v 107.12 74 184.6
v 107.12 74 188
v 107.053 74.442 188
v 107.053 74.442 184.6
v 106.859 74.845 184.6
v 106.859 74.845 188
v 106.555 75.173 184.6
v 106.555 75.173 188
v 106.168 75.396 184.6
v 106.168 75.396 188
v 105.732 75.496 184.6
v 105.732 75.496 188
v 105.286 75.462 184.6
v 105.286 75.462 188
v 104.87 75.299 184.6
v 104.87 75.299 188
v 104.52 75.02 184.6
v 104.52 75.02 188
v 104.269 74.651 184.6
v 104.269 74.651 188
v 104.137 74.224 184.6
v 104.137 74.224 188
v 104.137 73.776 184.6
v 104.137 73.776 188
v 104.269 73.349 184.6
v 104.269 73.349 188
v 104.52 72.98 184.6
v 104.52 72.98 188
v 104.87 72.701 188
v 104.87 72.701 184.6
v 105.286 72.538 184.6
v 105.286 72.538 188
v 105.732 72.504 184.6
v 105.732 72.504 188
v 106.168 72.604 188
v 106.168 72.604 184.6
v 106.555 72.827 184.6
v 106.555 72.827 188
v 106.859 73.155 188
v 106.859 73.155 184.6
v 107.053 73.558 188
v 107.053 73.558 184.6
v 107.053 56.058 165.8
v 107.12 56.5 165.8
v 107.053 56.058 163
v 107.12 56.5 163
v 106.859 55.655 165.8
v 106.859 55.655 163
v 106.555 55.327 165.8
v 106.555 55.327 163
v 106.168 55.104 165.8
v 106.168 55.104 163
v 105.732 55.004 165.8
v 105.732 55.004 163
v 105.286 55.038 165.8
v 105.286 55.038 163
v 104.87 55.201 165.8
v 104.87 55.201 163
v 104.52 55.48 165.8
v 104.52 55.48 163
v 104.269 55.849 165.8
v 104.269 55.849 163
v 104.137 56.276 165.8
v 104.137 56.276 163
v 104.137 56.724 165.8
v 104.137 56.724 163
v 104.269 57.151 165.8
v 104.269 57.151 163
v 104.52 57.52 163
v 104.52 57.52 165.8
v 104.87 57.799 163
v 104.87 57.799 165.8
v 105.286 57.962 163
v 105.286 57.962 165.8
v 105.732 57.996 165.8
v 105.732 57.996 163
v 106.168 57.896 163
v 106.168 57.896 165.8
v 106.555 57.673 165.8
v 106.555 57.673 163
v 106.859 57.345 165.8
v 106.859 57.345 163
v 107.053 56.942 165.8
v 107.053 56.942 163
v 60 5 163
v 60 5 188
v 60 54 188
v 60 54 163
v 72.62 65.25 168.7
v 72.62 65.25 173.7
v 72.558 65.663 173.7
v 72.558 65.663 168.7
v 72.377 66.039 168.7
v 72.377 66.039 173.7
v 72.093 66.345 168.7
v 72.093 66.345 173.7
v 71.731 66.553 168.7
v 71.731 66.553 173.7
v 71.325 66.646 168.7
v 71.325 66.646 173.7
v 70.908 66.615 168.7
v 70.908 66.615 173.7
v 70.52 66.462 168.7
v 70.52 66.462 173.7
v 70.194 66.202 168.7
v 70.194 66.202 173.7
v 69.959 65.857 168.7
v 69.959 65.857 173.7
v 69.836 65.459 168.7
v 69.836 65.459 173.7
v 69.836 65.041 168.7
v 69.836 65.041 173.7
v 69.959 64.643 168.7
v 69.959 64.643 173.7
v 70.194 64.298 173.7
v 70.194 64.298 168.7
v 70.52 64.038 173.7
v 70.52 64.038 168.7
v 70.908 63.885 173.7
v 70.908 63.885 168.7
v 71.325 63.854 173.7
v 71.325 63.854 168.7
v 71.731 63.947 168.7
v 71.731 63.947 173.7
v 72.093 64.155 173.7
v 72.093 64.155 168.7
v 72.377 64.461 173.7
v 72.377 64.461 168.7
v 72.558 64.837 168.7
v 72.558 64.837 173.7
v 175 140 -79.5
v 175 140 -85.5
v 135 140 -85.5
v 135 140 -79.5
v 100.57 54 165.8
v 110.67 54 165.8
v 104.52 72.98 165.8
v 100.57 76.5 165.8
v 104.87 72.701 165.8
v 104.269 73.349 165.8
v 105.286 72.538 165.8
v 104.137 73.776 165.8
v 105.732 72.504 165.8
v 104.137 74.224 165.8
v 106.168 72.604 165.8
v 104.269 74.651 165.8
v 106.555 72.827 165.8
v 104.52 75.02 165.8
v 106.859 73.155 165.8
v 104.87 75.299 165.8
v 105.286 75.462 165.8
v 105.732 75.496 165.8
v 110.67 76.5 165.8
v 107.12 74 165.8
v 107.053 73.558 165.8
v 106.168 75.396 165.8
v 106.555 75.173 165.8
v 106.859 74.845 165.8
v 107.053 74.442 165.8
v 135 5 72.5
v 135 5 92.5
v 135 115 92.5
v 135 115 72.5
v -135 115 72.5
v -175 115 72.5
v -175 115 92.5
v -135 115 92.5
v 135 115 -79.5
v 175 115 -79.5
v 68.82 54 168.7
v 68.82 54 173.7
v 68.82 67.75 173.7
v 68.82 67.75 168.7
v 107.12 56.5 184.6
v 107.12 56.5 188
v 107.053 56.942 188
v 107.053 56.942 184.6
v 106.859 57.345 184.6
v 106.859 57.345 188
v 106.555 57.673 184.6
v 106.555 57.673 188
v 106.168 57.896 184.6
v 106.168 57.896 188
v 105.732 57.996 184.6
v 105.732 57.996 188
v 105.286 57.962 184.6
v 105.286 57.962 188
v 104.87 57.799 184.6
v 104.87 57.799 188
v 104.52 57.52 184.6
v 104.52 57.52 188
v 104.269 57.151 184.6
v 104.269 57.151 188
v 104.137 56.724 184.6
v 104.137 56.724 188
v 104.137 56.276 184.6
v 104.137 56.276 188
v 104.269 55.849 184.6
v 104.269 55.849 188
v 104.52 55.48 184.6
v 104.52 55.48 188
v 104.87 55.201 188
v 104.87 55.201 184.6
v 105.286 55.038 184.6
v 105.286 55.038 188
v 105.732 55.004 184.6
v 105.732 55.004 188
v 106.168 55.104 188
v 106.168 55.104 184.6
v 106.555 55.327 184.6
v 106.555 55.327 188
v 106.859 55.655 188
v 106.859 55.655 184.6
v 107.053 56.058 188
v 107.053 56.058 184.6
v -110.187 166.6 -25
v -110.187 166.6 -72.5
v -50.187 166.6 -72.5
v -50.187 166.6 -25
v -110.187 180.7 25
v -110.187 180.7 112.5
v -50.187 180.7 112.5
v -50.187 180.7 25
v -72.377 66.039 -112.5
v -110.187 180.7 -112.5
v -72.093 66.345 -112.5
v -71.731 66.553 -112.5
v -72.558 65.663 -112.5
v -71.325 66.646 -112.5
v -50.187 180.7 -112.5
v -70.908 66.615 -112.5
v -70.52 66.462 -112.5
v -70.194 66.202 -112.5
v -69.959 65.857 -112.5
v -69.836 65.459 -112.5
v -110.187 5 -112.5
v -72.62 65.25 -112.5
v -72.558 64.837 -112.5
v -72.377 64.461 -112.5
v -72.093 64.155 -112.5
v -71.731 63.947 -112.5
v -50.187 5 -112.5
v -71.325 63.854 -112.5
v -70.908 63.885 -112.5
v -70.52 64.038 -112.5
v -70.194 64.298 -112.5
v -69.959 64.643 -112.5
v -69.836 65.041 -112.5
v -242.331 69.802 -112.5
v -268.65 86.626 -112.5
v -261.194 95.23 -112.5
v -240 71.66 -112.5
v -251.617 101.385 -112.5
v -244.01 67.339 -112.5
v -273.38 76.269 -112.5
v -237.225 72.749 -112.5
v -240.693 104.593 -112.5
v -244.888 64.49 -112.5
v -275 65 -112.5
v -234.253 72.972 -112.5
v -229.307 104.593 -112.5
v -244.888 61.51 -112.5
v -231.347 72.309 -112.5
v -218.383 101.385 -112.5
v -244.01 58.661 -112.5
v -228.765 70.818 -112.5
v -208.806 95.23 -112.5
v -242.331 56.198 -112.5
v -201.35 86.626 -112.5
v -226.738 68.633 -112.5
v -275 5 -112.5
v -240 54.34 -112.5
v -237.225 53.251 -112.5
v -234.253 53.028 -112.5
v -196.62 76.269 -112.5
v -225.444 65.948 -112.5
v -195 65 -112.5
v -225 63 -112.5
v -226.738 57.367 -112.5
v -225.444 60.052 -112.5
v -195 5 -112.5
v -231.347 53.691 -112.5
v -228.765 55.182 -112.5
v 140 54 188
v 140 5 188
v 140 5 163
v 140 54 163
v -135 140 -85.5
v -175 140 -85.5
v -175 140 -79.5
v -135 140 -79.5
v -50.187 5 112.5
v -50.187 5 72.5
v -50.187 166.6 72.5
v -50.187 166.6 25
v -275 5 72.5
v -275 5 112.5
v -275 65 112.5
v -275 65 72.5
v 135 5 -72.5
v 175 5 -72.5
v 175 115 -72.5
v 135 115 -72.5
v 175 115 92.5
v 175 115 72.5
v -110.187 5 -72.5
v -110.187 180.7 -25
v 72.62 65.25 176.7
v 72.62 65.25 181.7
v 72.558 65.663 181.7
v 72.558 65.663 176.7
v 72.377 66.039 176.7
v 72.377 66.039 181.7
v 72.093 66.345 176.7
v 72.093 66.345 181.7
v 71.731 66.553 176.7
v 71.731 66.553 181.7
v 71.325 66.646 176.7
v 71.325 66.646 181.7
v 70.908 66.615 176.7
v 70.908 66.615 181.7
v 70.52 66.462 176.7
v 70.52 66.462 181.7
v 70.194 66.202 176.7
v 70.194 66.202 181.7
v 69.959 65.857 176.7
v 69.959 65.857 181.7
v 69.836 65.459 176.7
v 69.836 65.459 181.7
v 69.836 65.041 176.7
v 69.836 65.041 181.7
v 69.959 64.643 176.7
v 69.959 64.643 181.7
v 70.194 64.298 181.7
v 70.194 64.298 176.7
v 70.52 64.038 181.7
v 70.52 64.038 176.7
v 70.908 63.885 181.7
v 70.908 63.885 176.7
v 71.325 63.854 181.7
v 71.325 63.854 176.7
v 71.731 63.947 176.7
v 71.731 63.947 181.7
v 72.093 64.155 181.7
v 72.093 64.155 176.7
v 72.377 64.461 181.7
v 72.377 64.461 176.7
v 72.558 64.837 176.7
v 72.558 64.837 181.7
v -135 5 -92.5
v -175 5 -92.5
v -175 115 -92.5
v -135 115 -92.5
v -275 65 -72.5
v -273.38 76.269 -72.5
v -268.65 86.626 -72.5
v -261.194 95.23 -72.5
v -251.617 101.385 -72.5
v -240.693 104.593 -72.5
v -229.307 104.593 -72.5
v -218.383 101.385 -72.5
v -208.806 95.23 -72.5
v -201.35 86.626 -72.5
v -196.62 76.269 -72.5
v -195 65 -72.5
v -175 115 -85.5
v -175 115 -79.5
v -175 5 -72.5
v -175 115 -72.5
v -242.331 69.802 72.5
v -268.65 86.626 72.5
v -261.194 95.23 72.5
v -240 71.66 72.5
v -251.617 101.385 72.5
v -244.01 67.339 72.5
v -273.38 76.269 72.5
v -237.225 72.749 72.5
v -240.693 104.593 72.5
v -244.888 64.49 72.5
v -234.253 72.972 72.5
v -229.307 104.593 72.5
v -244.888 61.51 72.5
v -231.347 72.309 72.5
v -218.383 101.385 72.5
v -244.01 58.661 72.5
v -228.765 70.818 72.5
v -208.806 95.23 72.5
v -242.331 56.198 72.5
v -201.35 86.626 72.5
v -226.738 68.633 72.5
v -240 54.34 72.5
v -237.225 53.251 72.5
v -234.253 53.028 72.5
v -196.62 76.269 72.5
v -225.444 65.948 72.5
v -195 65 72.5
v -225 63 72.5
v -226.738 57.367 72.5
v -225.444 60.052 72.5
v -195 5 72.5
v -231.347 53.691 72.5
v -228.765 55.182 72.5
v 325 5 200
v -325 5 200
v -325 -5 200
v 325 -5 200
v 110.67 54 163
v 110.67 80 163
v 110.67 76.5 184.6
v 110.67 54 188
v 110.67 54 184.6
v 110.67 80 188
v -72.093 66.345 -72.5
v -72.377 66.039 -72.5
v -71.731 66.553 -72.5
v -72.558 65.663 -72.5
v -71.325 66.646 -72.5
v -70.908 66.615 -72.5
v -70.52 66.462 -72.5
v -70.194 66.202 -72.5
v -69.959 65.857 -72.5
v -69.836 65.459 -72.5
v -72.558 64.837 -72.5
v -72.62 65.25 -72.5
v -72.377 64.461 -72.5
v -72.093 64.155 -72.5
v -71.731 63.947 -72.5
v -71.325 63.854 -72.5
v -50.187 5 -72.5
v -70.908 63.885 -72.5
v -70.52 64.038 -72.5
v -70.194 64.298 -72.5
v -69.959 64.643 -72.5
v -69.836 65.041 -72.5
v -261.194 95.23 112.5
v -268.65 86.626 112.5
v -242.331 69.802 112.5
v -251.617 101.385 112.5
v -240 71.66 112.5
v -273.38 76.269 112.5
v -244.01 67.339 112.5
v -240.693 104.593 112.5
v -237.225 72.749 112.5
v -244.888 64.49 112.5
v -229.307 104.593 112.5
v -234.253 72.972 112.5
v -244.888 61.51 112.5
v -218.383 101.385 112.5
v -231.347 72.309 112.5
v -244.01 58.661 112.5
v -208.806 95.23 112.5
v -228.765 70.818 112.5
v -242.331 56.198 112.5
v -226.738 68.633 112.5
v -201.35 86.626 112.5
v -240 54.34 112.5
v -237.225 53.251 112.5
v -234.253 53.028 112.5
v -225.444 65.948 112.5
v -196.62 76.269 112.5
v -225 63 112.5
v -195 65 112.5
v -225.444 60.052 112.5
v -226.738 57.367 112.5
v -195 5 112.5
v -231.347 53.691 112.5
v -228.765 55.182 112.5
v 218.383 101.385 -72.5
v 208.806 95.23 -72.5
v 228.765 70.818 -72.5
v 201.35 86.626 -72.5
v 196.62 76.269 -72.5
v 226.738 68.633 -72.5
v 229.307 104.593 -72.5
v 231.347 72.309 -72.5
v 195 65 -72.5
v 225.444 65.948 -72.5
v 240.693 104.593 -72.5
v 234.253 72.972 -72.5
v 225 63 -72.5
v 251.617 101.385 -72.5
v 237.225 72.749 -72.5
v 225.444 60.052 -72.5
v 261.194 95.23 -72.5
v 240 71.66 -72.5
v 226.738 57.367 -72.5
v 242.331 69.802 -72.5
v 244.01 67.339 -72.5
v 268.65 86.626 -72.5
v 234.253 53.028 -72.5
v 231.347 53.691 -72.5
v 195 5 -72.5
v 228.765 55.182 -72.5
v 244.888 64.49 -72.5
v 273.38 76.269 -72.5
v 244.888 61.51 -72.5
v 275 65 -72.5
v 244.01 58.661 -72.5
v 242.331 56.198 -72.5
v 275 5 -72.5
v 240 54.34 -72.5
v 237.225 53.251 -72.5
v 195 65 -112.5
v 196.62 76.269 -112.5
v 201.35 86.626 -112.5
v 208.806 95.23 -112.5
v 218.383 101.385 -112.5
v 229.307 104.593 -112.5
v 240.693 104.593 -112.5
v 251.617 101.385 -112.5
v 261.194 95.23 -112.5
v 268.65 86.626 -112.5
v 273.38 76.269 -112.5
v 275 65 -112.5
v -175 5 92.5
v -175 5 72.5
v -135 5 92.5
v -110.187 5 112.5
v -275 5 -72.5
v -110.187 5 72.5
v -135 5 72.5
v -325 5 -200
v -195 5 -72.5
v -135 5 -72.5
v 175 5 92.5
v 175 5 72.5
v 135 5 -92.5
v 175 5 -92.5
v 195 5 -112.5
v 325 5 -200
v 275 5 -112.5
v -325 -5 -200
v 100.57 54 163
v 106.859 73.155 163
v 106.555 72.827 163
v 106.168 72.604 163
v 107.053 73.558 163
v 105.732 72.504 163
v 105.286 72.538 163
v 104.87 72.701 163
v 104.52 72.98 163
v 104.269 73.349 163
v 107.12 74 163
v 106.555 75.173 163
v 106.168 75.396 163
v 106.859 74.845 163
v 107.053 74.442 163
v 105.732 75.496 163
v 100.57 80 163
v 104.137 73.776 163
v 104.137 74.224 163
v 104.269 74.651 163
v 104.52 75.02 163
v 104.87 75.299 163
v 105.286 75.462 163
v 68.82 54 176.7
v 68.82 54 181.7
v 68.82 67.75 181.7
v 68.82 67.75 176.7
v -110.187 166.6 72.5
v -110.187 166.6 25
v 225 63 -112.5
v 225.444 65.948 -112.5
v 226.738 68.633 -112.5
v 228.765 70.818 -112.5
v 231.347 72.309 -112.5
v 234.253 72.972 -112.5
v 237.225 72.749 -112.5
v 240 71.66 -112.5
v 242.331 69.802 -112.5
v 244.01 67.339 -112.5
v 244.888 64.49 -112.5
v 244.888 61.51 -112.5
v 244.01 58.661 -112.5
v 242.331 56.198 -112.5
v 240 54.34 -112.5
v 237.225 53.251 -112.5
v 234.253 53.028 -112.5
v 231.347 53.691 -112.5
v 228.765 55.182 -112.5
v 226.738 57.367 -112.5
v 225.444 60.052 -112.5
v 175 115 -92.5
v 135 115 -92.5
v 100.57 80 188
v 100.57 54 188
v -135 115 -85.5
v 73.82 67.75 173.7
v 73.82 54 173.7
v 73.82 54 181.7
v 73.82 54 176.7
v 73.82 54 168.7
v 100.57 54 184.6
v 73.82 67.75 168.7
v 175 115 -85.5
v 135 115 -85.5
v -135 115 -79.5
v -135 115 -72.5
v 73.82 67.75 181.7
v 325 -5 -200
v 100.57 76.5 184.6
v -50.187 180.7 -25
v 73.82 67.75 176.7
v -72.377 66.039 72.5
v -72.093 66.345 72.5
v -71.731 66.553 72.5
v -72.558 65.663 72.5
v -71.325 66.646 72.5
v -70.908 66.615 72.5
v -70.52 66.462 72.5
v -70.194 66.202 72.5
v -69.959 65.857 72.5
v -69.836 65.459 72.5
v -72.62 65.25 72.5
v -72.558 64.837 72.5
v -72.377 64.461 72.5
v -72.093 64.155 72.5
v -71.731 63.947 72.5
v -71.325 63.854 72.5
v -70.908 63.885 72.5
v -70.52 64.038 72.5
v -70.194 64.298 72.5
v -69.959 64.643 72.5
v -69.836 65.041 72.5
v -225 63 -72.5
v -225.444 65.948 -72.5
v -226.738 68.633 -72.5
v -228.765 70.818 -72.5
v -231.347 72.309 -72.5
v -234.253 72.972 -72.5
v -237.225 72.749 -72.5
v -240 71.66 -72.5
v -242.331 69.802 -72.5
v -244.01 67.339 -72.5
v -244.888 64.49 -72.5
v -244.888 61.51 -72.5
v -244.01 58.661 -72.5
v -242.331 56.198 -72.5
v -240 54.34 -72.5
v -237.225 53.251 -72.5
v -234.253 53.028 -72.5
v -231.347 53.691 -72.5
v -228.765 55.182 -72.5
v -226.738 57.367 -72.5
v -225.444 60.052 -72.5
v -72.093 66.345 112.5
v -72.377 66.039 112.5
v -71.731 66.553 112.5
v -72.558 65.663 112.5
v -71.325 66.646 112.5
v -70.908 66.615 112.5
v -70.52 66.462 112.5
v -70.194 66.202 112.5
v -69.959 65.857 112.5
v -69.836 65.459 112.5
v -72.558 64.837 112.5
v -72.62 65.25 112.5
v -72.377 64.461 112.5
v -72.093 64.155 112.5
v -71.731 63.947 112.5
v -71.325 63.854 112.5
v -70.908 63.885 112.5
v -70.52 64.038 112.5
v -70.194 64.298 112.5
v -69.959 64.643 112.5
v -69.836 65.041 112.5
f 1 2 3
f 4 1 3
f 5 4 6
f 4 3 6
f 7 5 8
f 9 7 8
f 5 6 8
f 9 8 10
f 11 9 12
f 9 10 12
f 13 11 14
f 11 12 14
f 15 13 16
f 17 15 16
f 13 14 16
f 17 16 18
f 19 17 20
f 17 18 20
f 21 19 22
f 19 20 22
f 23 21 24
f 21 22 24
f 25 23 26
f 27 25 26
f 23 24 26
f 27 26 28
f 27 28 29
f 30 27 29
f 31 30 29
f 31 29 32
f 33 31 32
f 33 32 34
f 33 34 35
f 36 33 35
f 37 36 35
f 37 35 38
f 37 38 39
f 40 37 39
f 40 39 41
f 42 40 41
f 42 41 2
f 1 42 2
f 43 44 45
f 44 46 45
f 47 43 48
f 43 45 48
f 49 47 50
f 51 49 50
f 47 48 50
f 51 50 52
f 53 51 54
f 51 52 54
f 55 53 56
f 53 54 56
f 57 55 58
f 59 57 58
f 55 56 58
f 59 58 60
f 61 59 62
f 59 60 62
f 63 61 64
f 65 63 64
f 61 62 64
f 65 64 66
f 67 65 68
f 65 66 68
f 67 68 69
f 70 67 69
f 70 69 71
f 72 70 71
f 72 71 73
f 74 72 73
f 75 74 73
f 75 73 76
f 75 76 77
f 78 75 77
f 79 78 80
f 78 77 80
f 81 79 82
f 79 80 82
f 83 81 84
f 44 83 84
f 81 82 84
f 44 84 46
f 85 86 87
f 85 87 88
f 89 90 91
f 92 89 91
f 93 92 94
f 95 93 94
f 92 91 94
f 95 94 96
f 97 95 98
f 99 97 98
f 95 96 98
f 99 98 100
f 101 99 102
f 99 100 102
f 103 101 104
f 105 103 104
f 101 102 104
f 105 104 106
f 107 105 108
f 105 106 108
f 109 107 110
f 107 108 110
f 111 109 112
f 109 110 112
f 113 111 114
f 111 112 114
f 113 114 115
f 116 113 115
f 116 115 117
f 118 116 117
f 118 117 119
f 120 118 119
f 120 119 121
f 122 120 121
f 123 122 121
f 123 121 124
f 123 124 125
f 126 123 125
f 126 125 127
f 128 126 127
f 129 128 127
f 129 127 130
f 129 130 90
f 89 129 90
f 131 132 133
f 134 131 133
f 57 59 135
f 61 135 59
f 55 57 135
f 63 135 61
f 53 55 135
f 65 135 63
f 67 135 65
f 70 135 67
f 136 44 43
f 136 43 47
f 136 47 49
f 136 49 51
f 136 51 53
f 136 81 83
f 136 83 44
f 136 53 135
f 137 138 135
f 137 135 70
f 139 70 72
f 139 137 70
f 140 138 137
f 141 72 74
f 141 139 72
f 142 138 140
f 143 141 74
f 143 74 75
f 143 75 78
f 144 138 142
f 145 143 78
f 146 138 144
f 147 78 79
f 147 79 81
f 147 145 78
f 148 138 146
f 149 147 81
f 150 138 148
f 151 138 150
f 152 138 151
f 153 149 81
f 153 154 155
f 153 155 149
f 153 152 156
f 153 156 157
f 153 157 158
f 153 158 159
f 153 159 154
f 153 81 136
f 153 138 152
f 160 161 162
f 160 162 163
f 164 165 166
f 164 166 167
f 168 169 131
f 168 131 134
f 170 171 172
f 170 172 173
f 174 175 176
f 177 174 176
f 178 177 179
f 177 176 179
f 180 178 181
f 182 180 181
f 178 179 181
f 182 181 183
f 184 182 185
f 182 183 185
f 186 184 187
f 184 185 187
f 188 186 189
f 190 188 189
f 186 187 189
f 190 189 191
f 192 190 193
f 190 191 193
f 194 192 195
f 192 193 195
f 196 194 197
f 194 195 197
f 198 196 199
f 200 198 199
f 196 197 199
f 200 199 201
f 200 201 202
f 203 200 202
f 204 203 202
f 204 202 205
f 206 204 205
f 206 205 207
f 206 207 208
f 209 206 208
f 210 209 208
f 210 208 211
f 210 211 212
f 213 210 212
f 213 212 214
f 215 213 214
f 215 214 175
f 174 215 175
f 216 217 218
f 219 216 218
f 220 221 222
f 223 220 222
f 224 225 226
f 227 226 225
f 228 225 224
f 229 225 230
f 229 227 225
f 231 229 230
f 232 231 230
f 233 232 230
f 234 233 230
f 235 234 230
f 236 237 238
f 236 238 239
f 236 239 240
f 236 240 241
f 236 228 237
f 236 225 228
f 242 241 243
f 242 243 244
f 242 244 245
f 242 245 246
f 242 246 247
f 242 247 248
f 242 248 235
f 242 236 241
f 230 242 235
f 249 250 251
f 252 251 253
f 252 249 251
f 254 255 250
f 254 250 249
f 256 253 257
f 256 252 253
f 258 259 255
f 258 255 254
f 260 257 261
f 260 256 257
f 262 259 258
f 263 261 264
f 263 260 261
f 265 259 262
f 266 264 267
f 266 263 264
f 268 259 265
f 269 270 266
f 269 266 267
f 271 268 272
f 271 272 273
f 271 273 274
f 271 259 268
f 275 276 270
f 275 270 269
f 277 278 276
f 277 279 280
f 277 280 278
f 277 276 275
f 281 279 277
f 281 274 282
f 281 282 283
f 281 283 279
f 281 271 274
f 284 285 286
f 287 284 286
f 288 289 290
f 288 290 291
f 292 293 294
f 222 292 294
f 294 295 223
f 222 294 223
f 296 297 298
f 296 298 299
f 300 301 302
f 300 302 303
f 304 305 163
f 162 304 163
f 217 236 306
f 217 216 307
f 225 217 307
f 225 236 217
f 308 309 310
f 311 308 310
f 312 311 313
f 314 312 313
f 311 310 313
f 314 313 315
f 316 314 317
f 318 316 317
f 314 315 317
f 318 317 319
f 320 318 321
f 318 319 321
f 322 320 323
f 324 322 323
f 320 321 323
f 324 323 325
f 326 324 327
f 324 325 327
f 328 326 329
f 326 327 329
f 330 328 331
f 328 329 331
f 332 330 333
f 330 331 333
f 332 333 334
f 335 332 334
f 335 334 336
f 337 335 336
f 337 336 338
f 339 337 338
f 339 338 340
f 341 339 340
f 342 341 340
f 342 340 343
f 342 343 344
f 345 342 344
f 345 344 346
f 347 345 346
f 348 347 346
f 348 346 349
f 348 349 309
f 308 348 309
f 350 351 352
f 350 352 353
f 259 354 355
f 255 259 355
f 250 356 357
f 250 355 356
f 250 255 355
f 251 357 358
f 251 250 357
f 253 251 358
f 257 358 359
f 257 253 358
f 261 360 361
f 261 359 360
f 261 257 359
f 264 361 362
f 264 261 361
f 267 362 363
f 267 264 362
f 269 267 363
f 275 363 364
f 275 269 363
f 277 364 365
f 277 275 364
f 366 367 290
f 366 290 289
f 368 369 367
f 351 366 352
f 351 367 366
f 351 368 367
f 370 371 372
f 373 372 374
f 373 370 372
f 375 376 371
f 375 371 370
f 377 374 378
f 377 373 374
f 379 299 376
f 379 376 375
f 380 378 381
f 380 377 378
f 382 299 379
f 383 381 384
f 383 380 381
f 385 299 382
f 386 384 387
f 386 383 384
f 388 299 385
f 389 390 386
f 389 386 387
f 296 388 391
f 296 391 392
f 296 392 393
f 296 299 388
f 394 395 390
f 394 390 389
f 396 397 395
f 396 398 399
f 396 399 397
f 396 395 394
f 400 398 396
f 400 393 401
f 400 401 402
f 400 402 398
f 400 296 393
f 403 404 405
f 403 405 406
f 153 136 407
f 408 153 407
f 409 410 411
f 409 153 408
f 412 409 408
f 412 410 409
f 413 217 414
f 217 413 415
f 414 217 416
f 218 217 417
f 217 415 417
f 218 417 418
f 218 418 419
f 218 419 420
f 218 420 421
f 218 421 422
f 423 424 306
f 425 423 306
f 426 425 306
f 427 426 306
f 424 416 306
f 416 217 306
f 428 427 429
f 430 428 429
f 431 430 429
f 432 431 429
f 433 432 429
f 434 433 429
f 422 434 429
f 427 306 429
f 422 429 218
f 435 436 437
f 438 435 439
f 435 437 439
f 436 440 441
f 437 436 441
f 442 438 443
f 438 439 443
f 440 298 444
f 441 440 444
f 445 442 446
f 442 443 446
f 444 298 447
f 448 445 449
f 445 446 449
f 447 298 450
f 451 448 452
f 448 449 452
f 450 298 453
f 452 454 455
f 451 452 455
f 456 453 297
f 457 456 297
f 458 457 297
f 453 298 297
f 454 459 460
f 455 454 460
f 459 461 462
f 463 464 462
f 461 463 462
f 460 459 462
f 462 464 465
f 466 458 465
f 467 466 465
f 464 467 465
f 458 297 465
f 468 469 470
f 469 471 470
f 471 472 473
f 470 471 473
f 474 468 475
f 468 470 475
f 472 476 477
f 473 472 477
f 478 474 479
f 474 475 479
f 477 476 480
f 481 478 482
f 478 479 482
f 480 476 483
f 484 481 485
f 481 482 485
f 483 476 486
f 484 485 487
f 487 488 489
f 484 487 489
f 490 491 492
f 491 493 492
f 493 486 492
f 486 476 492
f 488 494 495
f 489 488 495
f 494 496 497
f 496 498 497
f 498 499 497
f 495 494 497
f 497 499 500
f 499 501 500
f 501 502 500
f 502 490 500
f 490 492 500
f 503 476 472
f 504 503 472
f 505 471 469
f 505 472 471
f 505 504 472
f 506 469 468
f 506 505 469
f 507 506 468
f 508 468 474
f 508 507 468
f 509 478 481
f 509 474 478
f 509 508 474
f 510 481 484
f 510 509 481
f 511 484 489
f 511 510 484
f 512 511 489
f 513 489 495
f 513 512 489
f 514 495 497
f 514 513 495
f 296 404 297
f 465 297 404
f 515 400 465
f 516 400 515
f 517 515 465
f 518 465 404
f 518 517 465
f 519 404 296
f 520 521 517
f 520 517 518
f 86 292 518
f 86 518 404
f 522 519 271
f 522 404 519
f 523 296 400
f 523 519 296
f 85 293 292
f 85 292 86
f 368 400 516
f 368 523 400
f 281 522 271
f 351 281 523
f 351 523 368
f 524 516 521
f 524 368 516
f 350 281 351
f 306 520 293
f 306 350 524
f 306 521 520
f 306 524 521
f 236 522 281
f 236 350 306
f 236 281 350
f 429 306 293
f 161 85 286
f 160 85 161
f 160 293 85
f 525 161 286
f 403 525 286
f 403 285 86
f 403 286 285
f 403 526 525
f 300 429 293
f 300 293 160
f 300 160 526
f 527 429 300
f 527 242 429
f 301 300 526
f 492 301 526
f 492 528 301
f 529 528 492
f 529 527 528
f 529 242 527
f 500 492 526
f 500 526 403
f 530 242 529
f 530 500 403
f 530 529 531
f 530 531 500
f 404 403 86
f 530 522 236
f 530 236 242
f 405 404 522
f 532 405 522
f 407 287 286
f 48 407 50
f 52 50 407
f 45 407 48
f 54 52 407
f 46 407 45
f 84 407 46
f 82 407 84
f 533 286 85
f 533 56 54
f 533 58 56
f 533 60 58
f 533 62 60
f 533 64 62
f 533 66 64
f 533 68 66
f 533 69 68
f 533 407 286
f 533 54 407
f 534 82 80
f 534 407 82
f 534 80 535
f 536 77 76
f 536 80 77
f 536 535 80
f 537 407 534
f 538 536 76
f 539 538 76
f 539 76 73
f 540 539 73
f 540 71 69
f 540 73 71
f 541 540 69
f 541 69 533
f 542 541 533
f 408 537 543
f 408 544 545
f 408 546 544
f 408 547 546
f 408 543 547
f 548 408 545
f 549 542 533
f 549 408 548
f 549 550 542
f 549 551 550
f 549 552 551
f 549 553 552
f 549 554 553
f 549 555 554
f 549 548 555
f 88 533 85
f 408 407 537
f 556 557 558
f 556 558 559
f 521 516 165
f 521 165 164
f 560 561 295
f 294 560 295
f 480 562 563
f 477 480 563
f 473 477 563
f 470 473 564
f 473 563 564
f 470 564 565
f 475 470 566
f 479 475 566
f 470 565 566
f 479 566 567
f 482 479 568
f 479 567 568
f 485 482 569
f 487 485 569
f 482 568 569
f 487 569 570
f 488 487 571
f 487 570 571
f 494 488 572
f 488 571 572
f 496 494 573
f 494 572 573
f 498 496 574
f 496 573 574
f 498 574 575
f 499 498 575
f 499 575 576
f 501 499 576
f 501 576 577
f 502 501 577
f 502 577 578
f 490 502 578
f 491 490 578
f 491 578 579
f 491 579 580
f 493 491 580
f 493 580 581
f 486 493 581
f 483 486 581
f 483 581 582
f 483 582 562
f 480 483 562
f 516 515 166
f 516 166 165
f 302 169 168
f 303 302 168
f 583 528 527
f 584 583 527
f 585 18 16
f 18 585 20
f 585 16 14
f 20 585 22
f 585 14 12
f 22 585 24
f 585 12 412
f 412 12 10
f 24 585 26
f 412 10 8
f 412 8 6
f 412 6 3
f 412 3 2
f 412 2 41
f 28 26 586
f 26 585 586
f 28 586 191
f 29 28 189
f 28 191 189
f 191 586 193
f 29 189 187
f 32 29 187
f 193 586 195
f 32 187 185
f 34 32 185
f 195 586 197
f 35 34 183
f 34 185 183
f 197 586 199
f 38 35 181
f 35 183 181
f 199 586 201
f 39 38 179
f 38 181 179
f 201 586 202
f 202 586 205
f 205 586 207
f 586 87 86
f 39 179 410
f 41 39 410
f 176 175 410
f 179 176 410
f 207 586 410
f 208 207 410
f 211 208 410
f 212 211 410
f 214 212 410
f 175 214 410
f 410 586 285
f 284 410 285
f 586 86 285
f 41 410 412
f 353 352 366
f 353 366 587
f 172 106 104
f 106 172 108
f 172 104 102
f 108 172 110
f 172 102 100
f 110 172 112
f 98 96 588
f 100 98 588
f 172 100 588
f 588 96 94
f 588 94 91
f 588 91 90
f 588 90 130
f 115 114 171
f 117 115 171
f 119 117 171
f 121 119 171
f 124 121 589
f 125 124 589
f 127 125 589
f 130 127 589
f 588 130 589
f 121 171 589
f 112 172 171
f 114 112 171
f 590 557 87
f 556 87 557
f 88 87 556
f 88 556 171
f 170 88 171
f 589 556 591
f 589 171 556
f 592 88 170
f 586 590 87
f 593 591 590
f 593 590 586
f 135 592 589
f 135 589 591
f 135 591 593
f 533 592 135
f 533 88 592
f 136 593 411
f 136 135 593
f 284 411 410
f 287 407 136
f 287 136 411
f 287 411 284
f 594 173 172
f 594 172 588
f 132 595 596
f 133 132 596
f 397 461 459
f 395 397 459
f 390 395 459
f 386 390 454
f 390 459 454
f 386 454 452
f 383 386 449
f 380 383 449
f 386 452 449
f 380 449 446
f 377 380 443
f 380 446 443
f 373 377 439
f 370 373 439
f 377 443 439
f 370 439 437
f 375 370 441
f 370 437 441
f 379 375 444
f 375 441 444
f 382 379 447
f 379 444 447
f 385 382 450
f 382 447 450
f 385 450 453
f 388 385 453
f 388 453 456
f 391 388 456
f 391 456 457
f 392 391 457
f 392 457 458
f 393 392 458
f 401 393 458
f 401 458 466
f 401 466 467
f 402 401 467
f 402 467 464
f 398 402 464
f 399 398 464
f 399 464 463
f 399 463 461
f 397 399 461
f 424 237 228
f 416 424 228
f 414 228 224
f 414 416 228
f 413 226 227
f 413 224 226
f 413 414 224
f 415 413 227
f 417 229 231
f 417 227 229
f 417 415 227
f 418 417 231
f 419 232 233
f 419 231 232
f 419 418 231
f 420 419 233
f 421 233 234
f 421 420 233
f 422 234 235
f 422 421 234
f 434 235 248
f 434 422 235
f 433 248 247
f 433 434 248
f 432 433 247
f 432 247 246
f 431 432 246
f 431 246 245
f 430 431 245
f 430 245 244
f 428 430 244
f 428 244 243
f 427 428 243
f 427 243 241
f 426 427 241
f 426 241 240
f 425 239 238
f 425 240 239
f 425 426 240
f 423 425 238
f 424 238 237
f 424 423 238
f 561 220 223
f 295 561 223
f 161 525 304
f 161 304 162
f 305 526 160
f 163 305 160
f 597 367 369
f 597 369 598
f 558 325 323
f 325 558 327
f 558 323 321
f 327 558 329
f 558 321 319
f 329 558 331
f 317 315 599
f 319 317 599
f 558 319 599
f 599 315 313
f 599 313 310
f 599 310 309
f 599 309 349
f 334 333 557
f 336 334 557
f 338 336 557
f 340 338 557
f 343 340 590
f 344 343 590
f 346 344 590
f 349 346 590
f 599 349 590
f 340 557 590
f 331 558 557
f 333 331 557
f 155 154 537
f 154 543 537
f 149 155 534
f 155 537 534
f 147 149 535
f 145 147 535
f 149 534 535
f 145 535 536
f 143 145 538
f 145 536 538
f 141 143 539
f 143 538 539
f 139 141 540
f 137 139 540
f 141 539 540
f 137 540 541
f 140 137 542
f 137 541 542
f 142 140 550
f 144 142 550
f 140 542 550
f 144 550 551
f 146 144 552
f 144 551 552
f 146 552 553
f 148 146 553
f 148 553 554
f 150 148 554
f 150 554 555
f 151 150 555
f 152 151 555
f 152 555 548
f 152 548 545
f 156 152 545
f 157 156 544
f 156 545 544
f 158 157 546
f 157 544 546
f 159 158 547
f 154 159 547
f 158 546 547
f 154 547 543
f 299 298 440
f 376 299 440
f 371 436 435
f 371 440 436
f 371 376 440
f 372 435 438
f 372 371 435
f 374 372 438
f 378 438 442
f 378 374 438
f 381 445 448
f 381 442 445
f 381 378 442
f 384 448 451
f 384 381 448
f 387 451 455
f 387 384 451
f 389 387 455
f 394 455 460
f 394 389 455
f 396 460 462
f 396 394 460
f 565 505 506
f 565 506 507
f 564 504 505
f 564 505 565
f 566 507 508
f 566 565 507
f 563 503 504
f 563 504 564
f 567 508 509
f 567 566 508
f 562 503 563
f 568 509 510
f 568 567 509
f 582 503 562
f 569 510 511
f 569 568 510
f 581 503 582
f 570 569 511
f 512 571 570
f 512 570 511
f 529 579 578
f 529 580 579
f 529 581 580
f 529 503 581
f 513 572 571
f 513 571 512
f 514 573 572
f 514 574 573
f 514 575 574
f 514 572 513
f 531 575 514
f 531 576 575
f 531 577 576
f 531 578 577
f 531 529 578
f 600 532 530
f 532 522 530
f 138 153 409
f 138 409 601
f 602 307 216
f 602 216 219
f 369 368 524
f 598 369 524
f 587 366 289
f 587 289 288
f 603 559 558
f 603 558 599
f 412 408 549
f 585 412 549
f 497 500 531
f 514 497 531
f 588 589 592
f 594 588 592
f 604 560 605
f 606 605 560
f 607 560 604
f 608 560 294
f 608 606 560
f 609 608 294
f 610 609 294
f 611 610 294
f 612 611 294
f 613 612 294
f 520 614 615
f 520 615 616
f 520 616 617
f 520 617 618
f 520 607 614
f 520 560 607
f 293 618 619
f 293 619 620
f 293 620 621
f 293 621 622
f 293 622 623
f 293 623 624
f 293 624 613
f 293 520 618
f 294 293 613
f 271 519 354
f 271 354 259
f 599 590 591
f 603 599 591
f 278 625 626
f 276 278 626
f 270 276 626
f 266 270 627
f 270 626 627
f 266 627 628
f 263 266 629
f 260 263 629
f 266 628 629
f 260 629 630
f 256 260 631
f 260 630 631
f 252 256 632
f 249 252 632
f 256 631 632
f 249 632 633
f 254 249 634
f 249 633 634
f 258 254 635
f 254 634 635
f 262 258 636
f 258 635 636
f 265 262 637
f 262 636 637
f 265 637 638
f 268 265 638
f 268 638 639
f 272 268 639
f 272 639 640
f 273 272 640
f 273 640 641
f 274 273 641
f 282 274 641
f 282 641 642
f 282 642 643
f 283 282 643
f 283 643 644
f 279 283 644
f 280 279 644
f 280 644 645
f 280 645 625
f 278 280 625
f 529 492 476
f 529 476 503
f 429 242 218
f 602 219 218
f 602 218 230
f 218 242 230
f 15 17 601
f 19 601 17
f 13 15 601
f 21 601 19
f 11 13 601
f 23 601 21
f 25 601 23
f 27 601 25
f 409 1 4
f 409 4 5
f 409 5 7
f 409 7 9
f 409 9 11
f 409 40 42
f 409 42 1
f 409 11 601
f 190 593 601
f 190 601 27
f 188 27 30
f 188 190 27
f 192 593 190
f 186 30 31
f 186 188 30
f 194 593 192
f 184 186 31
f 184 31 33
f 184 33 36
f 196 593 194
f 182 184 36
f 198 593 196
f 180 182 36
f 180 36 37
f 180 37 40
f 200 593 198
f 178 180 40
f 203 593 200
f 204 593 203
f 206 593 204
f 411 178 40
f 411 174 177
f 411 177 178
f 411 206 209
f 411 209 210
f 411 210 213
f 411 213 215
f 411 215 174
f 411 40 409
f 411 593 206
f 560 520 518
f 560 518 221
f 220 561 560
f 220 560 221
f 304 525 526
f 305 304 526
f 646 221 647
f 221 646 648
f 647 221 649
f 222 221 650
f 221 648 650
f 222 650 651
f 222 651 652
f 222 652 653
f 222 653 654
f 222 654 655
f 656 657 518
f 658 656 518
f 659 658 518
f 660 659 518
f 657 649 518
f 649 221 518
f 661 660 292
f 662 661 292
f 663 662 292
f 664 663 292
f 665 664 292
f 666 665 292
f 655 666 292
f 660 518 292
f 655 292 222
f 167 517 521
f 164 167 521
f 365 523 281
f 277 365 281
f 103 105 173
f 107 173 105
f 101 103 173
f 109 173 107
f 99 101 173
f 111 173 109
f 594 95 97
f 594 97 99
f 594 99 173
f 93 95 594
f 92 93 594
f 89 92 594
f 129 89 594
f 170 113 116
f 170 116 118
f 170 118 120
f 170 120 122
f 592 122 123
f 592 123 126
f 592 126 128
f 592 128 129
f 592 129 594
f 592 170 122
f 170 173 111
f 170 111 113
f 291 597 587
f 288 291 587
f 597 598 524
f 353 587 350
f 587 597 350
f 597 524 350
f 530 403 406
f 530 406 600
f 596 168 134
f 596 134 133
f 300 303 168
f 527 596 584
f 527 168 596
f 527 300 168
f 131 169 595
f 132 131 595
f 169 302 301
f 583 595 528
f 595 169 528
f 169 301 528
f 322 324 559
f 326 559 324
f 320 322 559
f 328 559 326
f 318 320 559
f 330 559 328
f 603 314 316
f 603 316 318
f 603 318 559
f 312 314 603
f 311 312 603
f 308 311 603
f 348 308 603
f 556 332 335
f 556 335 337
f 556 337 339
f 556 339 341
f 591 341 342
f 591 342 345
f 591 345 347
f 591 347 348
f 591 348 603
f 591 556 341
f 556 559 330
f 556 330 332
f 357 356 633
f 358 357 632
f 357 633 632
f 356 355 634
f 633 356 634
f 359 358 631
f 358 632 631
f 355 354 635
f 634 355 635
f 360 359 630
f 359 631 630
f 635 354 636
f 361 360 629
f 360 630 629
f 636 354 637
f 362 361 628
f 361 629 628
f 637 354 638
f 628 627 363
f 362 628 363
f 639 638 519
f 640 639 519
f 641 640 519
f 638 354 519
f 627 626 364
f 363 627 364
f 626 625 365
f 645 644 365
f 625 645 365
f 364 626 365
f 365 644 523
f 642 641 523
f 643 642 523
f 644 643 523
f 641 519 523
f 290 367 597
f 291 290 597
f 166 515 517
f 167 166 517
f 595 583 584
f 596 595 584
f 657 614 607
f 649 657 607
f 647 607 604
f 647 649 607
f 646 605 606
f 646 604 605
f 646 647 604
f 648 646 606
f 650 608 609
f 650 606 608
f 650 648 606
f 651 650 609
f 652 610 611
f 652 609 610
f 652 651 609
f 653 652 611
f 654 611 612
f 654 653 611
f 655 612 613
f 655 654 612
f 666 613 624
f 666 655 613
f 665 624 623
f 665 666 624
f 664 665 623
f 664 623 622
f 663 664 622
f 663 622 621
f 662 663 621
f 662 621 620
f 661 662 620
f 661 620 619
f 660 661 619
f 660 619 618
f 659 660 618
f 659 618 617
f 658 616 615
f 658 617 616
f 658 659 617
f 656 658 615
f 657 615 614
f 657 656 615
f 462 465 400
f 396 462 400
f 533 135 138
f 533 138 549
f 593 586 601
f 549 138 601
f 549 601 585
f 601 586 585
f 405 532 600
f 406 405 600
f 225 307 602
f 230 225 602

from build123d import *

# Parameters (mm, degrees)
ESQUISSE2_W             = 650
ESQUISSE2_H             = 400
BOSS_EXTRU_1_DEPTH      = 5
ESQUISSE3_W             = 80
ESQUISSE3_H             = 40
BOSS_EXTRU_3_DEPTH      = 100
CONG_2_RADIUS           = 40
CONG_2_LENGTH           = 40
CONG_3_RADIUS           = 40
CONG_3_LENGTH           = 40
CONG_4_RADIUS           = 40
CONG_4_LENGTH           = 40
ESQUISSE6_R             = 10
ENL_V_MAT_EXTRU_2_DEPTH = 463.932230461
ESQUISSE7_R             = 10
ENL_V_MAT_EXTRU_3_DEPTH = 463.932230461
ESQUISSE9_W             = 80
ESQUISSE9_H             = 25
BOSS_EXTRU_4_DEPTH      = 49
ESQUISSE10_W            = 10.1
ESQUISSE10_H            = 3.4
BOSS_EXTRU_5_DEPTH      = 26
ENL_V_MAT_EXTRU_4_REACH = 518.908
ESQUISSE11_R            = 1.5
ESQUISSE12_W            = 10.1
ESQUISSE12_H            = 3.5
BOSS_EXTRU_6_DEPTH      = 21.6
ESQUISSE13_W            = 10.1
ESQUISSE13_H            = 2.8
BOSS_EXTRU_7_DEPTH      = 26
ENL_V_MAT_EXTRU_5_REACH = 500.416
ESQUISSE14_R            = 1.5
ESQUISSE15_W            = 5
ESQUISSE15_H            = 5
BOSS_EXTRU_8_DEPTH      = 13.75
ESQUISSE16_R            = 1.4
ENL_V_MAT_EXTRU_6_DEPTH = 513.19614407
ESQUISSE17_W            = 40
ESQUISSE17_H            = 20
BOSS_EXTRU_9_DEPTH      = 110
ESQUISSE18_W            = 40
ESQUISSE18_H            = 6
BOSS_EXTRU_10_DEPTH     = 25
ESQUISSE20_W            = 60
ESQUISSE20_H            = 40
BOSS_EXTRU_11_DEPTH     = 175.7
BOSS_EXTRU_12_REACH     = 463.014
ESQUISSE21_W            = 60
ESQUISSE21_H            = 14.1
ENL_V_MAT_EXTRU_7_REACH = 426.393
ESQUISSE22_W            = 60
ESQUISSE22_H            = 50


with BuildPart() as part:
    # Esquisse2 → Boss.-Extru.1 (new, symmetric)
    with BuildSketch(Plane(origin=(0, 0, 0), x_dir=(1, 0, 0), z_dir=(0, 1, 0))):
        Rectangle(ESQUISSE2_W, ESQUISSE2_H)
    extrude(amount=BOSS_EXTRU_1_DEPTH, both=True)

    # Esquisse3 → Boss.-Extru.3 (add)
    with BuildSketch(Plane(origin=(0, 5, 0), x_dir=(1, 0, 0), z_dir=(0, 1, 0))):
        with Locations((-235, -92.5)):
            Rectangle(ESQUISSE3_W, ESQUISSE3_H)
        with Locations((235, 92.5)):
            Rectangle(ESQUISSE3_W, ESQUISSE3_H)
        with Locations((-235, 92.5)):
            Rectangle(ESQUISSE3_W, ESQUISSE3_H)
    extrude(amount=BOSS_EXTRU_3_DEPTH)

    # Congé2: full round fillet: the end face becomes a half cylinder, R = half its width
    cong_2_face = Plane((-235, 105, 92.5), x_dir=(0, 0, -1), z_dir=(0, 1, 0))  # on the end face: x along it, z out of the body
    cong_2_slab = cong_2_face.offset(-CONG_2_RADIUS / 2) * Box(CONG_2_LENGTH, 2 * CONG_2_RADIUS, CONG_2_RADIUS, mode=Mode.PRIVATE)  # the body's end, R deep
    cong_2_round = Plane((-235, 65, 92.5), x_dir=(0, 1, 0), z_dir=(0, 0, -1)) * Cylinder(CONG_2_RADIUS, CONG_2_LENGTH, mode=Mode.PRIVATE)  # its axis R under the face
    add(cong_2_slab - cong_2_round, mode=Mode.SUBTRACT)

    # Congé3: full round fillet: the end face becomes a half cylinder, R = half its width
    cong_3_face = Plane((-235, 105, -92.5), x_dir=(0, 0, -1), z_dir=(0, 1, 0))  # on the end face: x along it, z out of the body
    cong_3_slab = cong_3_face.offset(-CONG_3_RADIUS / 2) * Box(CONG_3_LENGTH, 2 * CONG_3_RADIUS, CONG_3_RADIUS, mode=Mode.PRIVATE)  # the body's end, R deep
    cong_3_round = Plane((-235, 65, -92.5), x_dir=(0, 1, 0), z_dir=(0, 0, -1)) * Cylinder(CONG_3_RADIUS, CONG_3_LENGTH, mode=Mode.PRIVATE)  # its axis R under the face
    add(cong_3_slab - cong_3_round, mode=Mode.SUBTRACT)

    # Congé4: full round fillet: the end face becomes a half cylinder, R = half its width
    cong_4_face = Plane((235, 105, -92.5), x_dir=(0, 0, -1), z_dir=(0, 1, 0))  # on the end face: x along it, z out of the body
    cong_4_slab = cong_4_face.offset(-CONG_4_RADIUS / 2) * Box(CONG_4_LENGTH, 2 * CONG_4_RADIUS, CONG_4_RADIUS, mode=Mode.PRIVATE)  # the body's end, R deep
    cong_4_round = Plane((235, 65, -92.5), x_dir=(0, 1, 0), z_dir=(0, 0, -1)) * Cylinder(CONG_4_RADIUS, CONG_4_LENGTH, mode=Mode.PRIVATE)  # its axis R under the face
    add(cong_4_slab - cong_4_round, mode=Mode.SUBTRACT)

    # Esquisse6 → Enlèv. mat.-Extru.2 (cut, through all)
    with BuildSketch(Plane.XY.offset(112.5)):
        with Locations((-235, 63)):
            Circle(ESQUISSE6_R)
    extrude(amount=-ENL_V_MAT_EXTRU_2_DEPTH, mode=Mode.SUBTRACT)

    # Esquisse7 → Enlèv. mat.-Extru.3 (cut, through all)
    with BuildSketch(Plane(origin=(0, 0, -112.5), x_dir=(-1, 0, 0), z_dir=(0, 0, -1))):
        with Locations((-235, 63)):
            Circle(ESQUISSE7_R)
    extrude(amount=-ENL_V_MAT_EXTRU_3_DEPTH, mode=Mode.SUBTRACT)

    # Esquisse9 → Boss.-Extru.4 (add)
    with BuildSketch(Plane(origin=(0, 5, 0), x_dir=(1, 0, 0), z_dir=(0, 1, 0))):
        with Locations((100, -175.5)):
            Rectangle(ESQUISSE9_W, ESQUISSE9_H)
    extrude(amount=BOSS_EXTRU_4_DEPTH)

    # Esquisse10 → Boss.-Extru.5 (add)
    with BuildSketch(Plane(origin=(0, 54, 0), x_dir=(1, 0, 0), z_dir=(0, 1, 0))):
        with Locations((105.62, -186.3)):
            Rectangle(ESQUISSE10_W, ESQUISSE10_H)
    extrude(amount=BOSS_EXTRU_5_DEPTH)

    # Esquisse11 → Enlèv. mat.-Extru.4 (cut, up to next)
    with BuildSketch(Plane.XY.offset(188), mode=Mode.PRIVATE) as enl_v_mat_extru_4_sk1:
        with Locations((105.62, 56.5)):
            Circle(ESQUISSE11_R)
    enl_v_mat_extru_4_tool1 = extrude(enl_v_mat_extru_4_sk1.sketch, amount=-ENL_V_MAT_EXTRU_4_REACH, mode=Mode.PRIVATE) & part.part
    # Esquisse11 → Enlèv. mat.-Extru.4 (cut, up to next)
    with BuildSketch(Plane.XY.offset(188), mode=Mode.PRIVATE) as enl_v_mat_extru_4_sk2:
        with Locations((105.62, 74)):
            Circle(ESQUISSE11_R)
    enl_v_mat_extru_4_tool2 = extrude(enl_v_mat_extru_4_sk2.sketch, amount=-ENL_V_MAT_EXTRU_4_REACH, mode=Mode.PRIVATE) & part.part
    add(enl_v_mat_extru_4_tool1.solids().sort_by_distance((105.62, 56.5, 188))[0], mode=Mode.SUBTRACT)
    add(enl_v_mat_extru_4_tool2.solids().sort_by_distance((105.62, 74, 188))[0], mode=Mode.SUBTRACT)

    # Esquisse12 → Boss.-Extru.6 (add)
    with BuildSketch(Plane(origin=(0, 0, 184.6), x_dir=(-1, 0, 0), z_dir=(0, 0, -1))):
        with Locations((-105.62, 78.25)):
            Rectangle(ESQUISSE12_W, ESQUISSE12_H)
    extrude(amount=BOSS_EXTRU_6_DEPTH)

    # Esquisse13 → Boss.-Extru.7 (add)
    with BuildSketch(Plane(origin=(0, 80, 0), x_dir=(1, 0, 0), z_dir=(0, 1, 0))):
        with Locations((105.62, -164.4)):
            Rectangle(ESQUISSE13_W, ESQUISSE13_H)
    extrude(amount=-BOSS_EXTRU_7_DEPTH)

    # Esquisse14 → Enlèv. mat.-Extru.5 (cut, up to next)
    with BuildSketch(Plane(origin=(0, 0, 163), x_dir=(-1, 0, 0), z_dir=(0, 0, -1)), mode=Mode.PRIVATE) as enl_v_mat_extru_5_sk1:
        with Locations(Location((-105.62, 74, 0), (0, 0, 180))):
            Circle(ESQUISSE14_R)
    enl_v_mat_extru_5_tool1 = extrude(enl_v_mat_extru_5_sk1.sketch, amount=-ENL_V_MAT_EXTRU_5_REACH, mode=Mode.PRIVATE) & part.part
    # Esquisse14 → Enlèv. mat.-Extru.5 (cut, up to next)
    with BuildSketch(Plane(origin=(0, 0, 163), x_dir=(-1, 0, 0), z_dir=(0, 0, -1)), mode=Mode.PRIVATE) as enl_v_mat_extru_5_sk2:
        with Locations(Location((-105.62, 56.5, 0), (0, 0, 180))):
            Circle(ESQUISSE14_R)
    enl_v_mat_extru_5_tool2 = extrude(enl_v_mat_extru_5_sk2.sketch, amount=-ENL_V_MAT_EXTRU_5_REACH, mode=Mode.PRIVATE) & part.part
    add(enl_v_mat_extru_5_tool1.solids().sort_by_distance((105.62, 74, 163))[0], mode=Mode.SUBTRACT)
    add(enl_v_mat_extru_5_tool2.solids().sort_by_distance((105.62, 56.5, 163))[0], mode=Mode.SUBTRACT)

    # Esquisse15 → Boss.-Extru.8 (add)
    with BuildSketch(Plane(origin=(0, 54, 0), x_dir=(1, 0, 0), z_dir=(0, 1, 0))):
        with Locations((71.32, -179.2)):
            Rectangle(ESQUISSE15_W, ESQUISSE15_H)
        with Locations((71.32, -171.2)):
            Rectangle(ESQUISSE15_W, ESQUISSE15_H)
    extrude(amount=BOSS_EXTRU_8_DEPTH)

    # Esquisse16 → Enlèv. mat.-Extru.6 (cut, through all)
    with BuildSketch(Plane.XY.offset(181.7)):
        with Locations((71.22, 65.25)):
            Circle(ESQUISSE16_R)
    enl_v_mat_extru_6 = extrude(amount=-ENL_V_MAT_EXTRU_6_DEPTH, mode=Mode.SUBTRACT)

    # Esquisse17 → Boss.-Extru.9 (add)
    with BuildSketch(Plane(origin=(0, 5, 0), x_dir=(1, 0, 0), z_dir=(0, 1, 0))):
        with Locations((-155, -82.5)):
            Rectangle(ESQUISSE17_W, ESQUISSE17_H)
        with Locations((-155, 82.5)):
            Rectangle(ESQUISSE17_W, ESQUISSE17_H)
    boss_extru_9 = extrude(amount=BOSS_EXTRU_9_DEPTH)

    # Esquisse18 → Boss.-Extru.10 (add)
    with BuildSketch(Plane(origin=(0, 115, 0), x_dir=(1, 0, 0), z_dir=(0, 1, 0))):
        with Locations((-155, 82.5)):
            Rectangle(ESQUISSE18_W, ESQUISSE18_H)
    boss_extru_10 = extrude(amount=BOSS_EXTRU_10_DEPTH)

    # Esquisse20 → Boss.-Extru.11 (add)
    with BuildSketch(Plane(origin=(0, 5, 0), x_dir=(1, 0, 0), z_dir=(0, 1, 0))):
        with Locations((-80.1874064, -92.5)):
            Rectangle(ESQUISSE20_W, ESQUISSE20_H)
        with Locations((-80.1874064, 92.5)):
            Rectangle(ESQUISSE20_W, ESQUISSE20_H)
    extrude(amount=BOSS_EXTRU_11_DEPTH)

    # Esquisse21 → Boss.-Extru.12 (add, up to next)
    with BuildSketch(Plane.XY.offset(-72.5), mode=Mode.PRIVATE) as boss_extru_12_sk1:
        with Locations((-80.1874064, 173.65)):
            Rectangle(ESQUISSE21_W, ESQUISSE21_H)
    boss_extru_12_tool1 = extrude(boss_extru_12_sk1.sketch, amount=BOSS_EXTRU_12_REACH, mode=Mode.PRIVATE) - part.part
    add(boss_extru_12_tool1.solids().sort_by_distance((-80.187406, 173.65, -72.5))[0])

    # Esquisse22 → Enlèv. mat.-Extru.7 (cut, up to next)
    with BuildSketch(Plane(origin=(0, 180.7, 0), x_dir=(1, 0, 0), z_dir=(0, 1, 0)), mode=Mode.PRIVATE) as enl_v_mat_extru_7_sk1:
        with Locations((-80.1874064, 0)):
            Rectangle(ESQUISSE22_W, ESQUISSE22_H)
    enl_v_mat_extru_7_tool1 = extrude(enl_v_mat_extru_7_sk1.sketch, amount=-ENL_V_MAT_EXTRU_7_REACH, mode=Mode.PRIVATE) & part.part
    add(enl_v_mat_extru_7_tool1.solids().sort_by_distance((-80.187406, 180.7, 0))[0], mode=Mode.SUBTRACT)

    # Symétrie1: Enlèv. mat.-Extru.6, Boss.-Extru.9, Boss.-Extru.10 across plane
    add(enl_v_mat_extru_6.mirror(Plane(origin=(0, 0, 0), x_dir=(0, 0, 1), z_dir=(1, 0, 0))), mode=Mode.SUBTRACT)
    add(boss_extru_9.mirror(Plane(origin=(0, 0, 0), x_dir=(0, 0, 1), z_dir=(1, 0, 0))))
    add(boss_extru_10.mirror(Plane(origin=(0, 0, 0), x_dir=(0, 0, 1), z_dir=(1, 0, 0))))


solid = part.part
